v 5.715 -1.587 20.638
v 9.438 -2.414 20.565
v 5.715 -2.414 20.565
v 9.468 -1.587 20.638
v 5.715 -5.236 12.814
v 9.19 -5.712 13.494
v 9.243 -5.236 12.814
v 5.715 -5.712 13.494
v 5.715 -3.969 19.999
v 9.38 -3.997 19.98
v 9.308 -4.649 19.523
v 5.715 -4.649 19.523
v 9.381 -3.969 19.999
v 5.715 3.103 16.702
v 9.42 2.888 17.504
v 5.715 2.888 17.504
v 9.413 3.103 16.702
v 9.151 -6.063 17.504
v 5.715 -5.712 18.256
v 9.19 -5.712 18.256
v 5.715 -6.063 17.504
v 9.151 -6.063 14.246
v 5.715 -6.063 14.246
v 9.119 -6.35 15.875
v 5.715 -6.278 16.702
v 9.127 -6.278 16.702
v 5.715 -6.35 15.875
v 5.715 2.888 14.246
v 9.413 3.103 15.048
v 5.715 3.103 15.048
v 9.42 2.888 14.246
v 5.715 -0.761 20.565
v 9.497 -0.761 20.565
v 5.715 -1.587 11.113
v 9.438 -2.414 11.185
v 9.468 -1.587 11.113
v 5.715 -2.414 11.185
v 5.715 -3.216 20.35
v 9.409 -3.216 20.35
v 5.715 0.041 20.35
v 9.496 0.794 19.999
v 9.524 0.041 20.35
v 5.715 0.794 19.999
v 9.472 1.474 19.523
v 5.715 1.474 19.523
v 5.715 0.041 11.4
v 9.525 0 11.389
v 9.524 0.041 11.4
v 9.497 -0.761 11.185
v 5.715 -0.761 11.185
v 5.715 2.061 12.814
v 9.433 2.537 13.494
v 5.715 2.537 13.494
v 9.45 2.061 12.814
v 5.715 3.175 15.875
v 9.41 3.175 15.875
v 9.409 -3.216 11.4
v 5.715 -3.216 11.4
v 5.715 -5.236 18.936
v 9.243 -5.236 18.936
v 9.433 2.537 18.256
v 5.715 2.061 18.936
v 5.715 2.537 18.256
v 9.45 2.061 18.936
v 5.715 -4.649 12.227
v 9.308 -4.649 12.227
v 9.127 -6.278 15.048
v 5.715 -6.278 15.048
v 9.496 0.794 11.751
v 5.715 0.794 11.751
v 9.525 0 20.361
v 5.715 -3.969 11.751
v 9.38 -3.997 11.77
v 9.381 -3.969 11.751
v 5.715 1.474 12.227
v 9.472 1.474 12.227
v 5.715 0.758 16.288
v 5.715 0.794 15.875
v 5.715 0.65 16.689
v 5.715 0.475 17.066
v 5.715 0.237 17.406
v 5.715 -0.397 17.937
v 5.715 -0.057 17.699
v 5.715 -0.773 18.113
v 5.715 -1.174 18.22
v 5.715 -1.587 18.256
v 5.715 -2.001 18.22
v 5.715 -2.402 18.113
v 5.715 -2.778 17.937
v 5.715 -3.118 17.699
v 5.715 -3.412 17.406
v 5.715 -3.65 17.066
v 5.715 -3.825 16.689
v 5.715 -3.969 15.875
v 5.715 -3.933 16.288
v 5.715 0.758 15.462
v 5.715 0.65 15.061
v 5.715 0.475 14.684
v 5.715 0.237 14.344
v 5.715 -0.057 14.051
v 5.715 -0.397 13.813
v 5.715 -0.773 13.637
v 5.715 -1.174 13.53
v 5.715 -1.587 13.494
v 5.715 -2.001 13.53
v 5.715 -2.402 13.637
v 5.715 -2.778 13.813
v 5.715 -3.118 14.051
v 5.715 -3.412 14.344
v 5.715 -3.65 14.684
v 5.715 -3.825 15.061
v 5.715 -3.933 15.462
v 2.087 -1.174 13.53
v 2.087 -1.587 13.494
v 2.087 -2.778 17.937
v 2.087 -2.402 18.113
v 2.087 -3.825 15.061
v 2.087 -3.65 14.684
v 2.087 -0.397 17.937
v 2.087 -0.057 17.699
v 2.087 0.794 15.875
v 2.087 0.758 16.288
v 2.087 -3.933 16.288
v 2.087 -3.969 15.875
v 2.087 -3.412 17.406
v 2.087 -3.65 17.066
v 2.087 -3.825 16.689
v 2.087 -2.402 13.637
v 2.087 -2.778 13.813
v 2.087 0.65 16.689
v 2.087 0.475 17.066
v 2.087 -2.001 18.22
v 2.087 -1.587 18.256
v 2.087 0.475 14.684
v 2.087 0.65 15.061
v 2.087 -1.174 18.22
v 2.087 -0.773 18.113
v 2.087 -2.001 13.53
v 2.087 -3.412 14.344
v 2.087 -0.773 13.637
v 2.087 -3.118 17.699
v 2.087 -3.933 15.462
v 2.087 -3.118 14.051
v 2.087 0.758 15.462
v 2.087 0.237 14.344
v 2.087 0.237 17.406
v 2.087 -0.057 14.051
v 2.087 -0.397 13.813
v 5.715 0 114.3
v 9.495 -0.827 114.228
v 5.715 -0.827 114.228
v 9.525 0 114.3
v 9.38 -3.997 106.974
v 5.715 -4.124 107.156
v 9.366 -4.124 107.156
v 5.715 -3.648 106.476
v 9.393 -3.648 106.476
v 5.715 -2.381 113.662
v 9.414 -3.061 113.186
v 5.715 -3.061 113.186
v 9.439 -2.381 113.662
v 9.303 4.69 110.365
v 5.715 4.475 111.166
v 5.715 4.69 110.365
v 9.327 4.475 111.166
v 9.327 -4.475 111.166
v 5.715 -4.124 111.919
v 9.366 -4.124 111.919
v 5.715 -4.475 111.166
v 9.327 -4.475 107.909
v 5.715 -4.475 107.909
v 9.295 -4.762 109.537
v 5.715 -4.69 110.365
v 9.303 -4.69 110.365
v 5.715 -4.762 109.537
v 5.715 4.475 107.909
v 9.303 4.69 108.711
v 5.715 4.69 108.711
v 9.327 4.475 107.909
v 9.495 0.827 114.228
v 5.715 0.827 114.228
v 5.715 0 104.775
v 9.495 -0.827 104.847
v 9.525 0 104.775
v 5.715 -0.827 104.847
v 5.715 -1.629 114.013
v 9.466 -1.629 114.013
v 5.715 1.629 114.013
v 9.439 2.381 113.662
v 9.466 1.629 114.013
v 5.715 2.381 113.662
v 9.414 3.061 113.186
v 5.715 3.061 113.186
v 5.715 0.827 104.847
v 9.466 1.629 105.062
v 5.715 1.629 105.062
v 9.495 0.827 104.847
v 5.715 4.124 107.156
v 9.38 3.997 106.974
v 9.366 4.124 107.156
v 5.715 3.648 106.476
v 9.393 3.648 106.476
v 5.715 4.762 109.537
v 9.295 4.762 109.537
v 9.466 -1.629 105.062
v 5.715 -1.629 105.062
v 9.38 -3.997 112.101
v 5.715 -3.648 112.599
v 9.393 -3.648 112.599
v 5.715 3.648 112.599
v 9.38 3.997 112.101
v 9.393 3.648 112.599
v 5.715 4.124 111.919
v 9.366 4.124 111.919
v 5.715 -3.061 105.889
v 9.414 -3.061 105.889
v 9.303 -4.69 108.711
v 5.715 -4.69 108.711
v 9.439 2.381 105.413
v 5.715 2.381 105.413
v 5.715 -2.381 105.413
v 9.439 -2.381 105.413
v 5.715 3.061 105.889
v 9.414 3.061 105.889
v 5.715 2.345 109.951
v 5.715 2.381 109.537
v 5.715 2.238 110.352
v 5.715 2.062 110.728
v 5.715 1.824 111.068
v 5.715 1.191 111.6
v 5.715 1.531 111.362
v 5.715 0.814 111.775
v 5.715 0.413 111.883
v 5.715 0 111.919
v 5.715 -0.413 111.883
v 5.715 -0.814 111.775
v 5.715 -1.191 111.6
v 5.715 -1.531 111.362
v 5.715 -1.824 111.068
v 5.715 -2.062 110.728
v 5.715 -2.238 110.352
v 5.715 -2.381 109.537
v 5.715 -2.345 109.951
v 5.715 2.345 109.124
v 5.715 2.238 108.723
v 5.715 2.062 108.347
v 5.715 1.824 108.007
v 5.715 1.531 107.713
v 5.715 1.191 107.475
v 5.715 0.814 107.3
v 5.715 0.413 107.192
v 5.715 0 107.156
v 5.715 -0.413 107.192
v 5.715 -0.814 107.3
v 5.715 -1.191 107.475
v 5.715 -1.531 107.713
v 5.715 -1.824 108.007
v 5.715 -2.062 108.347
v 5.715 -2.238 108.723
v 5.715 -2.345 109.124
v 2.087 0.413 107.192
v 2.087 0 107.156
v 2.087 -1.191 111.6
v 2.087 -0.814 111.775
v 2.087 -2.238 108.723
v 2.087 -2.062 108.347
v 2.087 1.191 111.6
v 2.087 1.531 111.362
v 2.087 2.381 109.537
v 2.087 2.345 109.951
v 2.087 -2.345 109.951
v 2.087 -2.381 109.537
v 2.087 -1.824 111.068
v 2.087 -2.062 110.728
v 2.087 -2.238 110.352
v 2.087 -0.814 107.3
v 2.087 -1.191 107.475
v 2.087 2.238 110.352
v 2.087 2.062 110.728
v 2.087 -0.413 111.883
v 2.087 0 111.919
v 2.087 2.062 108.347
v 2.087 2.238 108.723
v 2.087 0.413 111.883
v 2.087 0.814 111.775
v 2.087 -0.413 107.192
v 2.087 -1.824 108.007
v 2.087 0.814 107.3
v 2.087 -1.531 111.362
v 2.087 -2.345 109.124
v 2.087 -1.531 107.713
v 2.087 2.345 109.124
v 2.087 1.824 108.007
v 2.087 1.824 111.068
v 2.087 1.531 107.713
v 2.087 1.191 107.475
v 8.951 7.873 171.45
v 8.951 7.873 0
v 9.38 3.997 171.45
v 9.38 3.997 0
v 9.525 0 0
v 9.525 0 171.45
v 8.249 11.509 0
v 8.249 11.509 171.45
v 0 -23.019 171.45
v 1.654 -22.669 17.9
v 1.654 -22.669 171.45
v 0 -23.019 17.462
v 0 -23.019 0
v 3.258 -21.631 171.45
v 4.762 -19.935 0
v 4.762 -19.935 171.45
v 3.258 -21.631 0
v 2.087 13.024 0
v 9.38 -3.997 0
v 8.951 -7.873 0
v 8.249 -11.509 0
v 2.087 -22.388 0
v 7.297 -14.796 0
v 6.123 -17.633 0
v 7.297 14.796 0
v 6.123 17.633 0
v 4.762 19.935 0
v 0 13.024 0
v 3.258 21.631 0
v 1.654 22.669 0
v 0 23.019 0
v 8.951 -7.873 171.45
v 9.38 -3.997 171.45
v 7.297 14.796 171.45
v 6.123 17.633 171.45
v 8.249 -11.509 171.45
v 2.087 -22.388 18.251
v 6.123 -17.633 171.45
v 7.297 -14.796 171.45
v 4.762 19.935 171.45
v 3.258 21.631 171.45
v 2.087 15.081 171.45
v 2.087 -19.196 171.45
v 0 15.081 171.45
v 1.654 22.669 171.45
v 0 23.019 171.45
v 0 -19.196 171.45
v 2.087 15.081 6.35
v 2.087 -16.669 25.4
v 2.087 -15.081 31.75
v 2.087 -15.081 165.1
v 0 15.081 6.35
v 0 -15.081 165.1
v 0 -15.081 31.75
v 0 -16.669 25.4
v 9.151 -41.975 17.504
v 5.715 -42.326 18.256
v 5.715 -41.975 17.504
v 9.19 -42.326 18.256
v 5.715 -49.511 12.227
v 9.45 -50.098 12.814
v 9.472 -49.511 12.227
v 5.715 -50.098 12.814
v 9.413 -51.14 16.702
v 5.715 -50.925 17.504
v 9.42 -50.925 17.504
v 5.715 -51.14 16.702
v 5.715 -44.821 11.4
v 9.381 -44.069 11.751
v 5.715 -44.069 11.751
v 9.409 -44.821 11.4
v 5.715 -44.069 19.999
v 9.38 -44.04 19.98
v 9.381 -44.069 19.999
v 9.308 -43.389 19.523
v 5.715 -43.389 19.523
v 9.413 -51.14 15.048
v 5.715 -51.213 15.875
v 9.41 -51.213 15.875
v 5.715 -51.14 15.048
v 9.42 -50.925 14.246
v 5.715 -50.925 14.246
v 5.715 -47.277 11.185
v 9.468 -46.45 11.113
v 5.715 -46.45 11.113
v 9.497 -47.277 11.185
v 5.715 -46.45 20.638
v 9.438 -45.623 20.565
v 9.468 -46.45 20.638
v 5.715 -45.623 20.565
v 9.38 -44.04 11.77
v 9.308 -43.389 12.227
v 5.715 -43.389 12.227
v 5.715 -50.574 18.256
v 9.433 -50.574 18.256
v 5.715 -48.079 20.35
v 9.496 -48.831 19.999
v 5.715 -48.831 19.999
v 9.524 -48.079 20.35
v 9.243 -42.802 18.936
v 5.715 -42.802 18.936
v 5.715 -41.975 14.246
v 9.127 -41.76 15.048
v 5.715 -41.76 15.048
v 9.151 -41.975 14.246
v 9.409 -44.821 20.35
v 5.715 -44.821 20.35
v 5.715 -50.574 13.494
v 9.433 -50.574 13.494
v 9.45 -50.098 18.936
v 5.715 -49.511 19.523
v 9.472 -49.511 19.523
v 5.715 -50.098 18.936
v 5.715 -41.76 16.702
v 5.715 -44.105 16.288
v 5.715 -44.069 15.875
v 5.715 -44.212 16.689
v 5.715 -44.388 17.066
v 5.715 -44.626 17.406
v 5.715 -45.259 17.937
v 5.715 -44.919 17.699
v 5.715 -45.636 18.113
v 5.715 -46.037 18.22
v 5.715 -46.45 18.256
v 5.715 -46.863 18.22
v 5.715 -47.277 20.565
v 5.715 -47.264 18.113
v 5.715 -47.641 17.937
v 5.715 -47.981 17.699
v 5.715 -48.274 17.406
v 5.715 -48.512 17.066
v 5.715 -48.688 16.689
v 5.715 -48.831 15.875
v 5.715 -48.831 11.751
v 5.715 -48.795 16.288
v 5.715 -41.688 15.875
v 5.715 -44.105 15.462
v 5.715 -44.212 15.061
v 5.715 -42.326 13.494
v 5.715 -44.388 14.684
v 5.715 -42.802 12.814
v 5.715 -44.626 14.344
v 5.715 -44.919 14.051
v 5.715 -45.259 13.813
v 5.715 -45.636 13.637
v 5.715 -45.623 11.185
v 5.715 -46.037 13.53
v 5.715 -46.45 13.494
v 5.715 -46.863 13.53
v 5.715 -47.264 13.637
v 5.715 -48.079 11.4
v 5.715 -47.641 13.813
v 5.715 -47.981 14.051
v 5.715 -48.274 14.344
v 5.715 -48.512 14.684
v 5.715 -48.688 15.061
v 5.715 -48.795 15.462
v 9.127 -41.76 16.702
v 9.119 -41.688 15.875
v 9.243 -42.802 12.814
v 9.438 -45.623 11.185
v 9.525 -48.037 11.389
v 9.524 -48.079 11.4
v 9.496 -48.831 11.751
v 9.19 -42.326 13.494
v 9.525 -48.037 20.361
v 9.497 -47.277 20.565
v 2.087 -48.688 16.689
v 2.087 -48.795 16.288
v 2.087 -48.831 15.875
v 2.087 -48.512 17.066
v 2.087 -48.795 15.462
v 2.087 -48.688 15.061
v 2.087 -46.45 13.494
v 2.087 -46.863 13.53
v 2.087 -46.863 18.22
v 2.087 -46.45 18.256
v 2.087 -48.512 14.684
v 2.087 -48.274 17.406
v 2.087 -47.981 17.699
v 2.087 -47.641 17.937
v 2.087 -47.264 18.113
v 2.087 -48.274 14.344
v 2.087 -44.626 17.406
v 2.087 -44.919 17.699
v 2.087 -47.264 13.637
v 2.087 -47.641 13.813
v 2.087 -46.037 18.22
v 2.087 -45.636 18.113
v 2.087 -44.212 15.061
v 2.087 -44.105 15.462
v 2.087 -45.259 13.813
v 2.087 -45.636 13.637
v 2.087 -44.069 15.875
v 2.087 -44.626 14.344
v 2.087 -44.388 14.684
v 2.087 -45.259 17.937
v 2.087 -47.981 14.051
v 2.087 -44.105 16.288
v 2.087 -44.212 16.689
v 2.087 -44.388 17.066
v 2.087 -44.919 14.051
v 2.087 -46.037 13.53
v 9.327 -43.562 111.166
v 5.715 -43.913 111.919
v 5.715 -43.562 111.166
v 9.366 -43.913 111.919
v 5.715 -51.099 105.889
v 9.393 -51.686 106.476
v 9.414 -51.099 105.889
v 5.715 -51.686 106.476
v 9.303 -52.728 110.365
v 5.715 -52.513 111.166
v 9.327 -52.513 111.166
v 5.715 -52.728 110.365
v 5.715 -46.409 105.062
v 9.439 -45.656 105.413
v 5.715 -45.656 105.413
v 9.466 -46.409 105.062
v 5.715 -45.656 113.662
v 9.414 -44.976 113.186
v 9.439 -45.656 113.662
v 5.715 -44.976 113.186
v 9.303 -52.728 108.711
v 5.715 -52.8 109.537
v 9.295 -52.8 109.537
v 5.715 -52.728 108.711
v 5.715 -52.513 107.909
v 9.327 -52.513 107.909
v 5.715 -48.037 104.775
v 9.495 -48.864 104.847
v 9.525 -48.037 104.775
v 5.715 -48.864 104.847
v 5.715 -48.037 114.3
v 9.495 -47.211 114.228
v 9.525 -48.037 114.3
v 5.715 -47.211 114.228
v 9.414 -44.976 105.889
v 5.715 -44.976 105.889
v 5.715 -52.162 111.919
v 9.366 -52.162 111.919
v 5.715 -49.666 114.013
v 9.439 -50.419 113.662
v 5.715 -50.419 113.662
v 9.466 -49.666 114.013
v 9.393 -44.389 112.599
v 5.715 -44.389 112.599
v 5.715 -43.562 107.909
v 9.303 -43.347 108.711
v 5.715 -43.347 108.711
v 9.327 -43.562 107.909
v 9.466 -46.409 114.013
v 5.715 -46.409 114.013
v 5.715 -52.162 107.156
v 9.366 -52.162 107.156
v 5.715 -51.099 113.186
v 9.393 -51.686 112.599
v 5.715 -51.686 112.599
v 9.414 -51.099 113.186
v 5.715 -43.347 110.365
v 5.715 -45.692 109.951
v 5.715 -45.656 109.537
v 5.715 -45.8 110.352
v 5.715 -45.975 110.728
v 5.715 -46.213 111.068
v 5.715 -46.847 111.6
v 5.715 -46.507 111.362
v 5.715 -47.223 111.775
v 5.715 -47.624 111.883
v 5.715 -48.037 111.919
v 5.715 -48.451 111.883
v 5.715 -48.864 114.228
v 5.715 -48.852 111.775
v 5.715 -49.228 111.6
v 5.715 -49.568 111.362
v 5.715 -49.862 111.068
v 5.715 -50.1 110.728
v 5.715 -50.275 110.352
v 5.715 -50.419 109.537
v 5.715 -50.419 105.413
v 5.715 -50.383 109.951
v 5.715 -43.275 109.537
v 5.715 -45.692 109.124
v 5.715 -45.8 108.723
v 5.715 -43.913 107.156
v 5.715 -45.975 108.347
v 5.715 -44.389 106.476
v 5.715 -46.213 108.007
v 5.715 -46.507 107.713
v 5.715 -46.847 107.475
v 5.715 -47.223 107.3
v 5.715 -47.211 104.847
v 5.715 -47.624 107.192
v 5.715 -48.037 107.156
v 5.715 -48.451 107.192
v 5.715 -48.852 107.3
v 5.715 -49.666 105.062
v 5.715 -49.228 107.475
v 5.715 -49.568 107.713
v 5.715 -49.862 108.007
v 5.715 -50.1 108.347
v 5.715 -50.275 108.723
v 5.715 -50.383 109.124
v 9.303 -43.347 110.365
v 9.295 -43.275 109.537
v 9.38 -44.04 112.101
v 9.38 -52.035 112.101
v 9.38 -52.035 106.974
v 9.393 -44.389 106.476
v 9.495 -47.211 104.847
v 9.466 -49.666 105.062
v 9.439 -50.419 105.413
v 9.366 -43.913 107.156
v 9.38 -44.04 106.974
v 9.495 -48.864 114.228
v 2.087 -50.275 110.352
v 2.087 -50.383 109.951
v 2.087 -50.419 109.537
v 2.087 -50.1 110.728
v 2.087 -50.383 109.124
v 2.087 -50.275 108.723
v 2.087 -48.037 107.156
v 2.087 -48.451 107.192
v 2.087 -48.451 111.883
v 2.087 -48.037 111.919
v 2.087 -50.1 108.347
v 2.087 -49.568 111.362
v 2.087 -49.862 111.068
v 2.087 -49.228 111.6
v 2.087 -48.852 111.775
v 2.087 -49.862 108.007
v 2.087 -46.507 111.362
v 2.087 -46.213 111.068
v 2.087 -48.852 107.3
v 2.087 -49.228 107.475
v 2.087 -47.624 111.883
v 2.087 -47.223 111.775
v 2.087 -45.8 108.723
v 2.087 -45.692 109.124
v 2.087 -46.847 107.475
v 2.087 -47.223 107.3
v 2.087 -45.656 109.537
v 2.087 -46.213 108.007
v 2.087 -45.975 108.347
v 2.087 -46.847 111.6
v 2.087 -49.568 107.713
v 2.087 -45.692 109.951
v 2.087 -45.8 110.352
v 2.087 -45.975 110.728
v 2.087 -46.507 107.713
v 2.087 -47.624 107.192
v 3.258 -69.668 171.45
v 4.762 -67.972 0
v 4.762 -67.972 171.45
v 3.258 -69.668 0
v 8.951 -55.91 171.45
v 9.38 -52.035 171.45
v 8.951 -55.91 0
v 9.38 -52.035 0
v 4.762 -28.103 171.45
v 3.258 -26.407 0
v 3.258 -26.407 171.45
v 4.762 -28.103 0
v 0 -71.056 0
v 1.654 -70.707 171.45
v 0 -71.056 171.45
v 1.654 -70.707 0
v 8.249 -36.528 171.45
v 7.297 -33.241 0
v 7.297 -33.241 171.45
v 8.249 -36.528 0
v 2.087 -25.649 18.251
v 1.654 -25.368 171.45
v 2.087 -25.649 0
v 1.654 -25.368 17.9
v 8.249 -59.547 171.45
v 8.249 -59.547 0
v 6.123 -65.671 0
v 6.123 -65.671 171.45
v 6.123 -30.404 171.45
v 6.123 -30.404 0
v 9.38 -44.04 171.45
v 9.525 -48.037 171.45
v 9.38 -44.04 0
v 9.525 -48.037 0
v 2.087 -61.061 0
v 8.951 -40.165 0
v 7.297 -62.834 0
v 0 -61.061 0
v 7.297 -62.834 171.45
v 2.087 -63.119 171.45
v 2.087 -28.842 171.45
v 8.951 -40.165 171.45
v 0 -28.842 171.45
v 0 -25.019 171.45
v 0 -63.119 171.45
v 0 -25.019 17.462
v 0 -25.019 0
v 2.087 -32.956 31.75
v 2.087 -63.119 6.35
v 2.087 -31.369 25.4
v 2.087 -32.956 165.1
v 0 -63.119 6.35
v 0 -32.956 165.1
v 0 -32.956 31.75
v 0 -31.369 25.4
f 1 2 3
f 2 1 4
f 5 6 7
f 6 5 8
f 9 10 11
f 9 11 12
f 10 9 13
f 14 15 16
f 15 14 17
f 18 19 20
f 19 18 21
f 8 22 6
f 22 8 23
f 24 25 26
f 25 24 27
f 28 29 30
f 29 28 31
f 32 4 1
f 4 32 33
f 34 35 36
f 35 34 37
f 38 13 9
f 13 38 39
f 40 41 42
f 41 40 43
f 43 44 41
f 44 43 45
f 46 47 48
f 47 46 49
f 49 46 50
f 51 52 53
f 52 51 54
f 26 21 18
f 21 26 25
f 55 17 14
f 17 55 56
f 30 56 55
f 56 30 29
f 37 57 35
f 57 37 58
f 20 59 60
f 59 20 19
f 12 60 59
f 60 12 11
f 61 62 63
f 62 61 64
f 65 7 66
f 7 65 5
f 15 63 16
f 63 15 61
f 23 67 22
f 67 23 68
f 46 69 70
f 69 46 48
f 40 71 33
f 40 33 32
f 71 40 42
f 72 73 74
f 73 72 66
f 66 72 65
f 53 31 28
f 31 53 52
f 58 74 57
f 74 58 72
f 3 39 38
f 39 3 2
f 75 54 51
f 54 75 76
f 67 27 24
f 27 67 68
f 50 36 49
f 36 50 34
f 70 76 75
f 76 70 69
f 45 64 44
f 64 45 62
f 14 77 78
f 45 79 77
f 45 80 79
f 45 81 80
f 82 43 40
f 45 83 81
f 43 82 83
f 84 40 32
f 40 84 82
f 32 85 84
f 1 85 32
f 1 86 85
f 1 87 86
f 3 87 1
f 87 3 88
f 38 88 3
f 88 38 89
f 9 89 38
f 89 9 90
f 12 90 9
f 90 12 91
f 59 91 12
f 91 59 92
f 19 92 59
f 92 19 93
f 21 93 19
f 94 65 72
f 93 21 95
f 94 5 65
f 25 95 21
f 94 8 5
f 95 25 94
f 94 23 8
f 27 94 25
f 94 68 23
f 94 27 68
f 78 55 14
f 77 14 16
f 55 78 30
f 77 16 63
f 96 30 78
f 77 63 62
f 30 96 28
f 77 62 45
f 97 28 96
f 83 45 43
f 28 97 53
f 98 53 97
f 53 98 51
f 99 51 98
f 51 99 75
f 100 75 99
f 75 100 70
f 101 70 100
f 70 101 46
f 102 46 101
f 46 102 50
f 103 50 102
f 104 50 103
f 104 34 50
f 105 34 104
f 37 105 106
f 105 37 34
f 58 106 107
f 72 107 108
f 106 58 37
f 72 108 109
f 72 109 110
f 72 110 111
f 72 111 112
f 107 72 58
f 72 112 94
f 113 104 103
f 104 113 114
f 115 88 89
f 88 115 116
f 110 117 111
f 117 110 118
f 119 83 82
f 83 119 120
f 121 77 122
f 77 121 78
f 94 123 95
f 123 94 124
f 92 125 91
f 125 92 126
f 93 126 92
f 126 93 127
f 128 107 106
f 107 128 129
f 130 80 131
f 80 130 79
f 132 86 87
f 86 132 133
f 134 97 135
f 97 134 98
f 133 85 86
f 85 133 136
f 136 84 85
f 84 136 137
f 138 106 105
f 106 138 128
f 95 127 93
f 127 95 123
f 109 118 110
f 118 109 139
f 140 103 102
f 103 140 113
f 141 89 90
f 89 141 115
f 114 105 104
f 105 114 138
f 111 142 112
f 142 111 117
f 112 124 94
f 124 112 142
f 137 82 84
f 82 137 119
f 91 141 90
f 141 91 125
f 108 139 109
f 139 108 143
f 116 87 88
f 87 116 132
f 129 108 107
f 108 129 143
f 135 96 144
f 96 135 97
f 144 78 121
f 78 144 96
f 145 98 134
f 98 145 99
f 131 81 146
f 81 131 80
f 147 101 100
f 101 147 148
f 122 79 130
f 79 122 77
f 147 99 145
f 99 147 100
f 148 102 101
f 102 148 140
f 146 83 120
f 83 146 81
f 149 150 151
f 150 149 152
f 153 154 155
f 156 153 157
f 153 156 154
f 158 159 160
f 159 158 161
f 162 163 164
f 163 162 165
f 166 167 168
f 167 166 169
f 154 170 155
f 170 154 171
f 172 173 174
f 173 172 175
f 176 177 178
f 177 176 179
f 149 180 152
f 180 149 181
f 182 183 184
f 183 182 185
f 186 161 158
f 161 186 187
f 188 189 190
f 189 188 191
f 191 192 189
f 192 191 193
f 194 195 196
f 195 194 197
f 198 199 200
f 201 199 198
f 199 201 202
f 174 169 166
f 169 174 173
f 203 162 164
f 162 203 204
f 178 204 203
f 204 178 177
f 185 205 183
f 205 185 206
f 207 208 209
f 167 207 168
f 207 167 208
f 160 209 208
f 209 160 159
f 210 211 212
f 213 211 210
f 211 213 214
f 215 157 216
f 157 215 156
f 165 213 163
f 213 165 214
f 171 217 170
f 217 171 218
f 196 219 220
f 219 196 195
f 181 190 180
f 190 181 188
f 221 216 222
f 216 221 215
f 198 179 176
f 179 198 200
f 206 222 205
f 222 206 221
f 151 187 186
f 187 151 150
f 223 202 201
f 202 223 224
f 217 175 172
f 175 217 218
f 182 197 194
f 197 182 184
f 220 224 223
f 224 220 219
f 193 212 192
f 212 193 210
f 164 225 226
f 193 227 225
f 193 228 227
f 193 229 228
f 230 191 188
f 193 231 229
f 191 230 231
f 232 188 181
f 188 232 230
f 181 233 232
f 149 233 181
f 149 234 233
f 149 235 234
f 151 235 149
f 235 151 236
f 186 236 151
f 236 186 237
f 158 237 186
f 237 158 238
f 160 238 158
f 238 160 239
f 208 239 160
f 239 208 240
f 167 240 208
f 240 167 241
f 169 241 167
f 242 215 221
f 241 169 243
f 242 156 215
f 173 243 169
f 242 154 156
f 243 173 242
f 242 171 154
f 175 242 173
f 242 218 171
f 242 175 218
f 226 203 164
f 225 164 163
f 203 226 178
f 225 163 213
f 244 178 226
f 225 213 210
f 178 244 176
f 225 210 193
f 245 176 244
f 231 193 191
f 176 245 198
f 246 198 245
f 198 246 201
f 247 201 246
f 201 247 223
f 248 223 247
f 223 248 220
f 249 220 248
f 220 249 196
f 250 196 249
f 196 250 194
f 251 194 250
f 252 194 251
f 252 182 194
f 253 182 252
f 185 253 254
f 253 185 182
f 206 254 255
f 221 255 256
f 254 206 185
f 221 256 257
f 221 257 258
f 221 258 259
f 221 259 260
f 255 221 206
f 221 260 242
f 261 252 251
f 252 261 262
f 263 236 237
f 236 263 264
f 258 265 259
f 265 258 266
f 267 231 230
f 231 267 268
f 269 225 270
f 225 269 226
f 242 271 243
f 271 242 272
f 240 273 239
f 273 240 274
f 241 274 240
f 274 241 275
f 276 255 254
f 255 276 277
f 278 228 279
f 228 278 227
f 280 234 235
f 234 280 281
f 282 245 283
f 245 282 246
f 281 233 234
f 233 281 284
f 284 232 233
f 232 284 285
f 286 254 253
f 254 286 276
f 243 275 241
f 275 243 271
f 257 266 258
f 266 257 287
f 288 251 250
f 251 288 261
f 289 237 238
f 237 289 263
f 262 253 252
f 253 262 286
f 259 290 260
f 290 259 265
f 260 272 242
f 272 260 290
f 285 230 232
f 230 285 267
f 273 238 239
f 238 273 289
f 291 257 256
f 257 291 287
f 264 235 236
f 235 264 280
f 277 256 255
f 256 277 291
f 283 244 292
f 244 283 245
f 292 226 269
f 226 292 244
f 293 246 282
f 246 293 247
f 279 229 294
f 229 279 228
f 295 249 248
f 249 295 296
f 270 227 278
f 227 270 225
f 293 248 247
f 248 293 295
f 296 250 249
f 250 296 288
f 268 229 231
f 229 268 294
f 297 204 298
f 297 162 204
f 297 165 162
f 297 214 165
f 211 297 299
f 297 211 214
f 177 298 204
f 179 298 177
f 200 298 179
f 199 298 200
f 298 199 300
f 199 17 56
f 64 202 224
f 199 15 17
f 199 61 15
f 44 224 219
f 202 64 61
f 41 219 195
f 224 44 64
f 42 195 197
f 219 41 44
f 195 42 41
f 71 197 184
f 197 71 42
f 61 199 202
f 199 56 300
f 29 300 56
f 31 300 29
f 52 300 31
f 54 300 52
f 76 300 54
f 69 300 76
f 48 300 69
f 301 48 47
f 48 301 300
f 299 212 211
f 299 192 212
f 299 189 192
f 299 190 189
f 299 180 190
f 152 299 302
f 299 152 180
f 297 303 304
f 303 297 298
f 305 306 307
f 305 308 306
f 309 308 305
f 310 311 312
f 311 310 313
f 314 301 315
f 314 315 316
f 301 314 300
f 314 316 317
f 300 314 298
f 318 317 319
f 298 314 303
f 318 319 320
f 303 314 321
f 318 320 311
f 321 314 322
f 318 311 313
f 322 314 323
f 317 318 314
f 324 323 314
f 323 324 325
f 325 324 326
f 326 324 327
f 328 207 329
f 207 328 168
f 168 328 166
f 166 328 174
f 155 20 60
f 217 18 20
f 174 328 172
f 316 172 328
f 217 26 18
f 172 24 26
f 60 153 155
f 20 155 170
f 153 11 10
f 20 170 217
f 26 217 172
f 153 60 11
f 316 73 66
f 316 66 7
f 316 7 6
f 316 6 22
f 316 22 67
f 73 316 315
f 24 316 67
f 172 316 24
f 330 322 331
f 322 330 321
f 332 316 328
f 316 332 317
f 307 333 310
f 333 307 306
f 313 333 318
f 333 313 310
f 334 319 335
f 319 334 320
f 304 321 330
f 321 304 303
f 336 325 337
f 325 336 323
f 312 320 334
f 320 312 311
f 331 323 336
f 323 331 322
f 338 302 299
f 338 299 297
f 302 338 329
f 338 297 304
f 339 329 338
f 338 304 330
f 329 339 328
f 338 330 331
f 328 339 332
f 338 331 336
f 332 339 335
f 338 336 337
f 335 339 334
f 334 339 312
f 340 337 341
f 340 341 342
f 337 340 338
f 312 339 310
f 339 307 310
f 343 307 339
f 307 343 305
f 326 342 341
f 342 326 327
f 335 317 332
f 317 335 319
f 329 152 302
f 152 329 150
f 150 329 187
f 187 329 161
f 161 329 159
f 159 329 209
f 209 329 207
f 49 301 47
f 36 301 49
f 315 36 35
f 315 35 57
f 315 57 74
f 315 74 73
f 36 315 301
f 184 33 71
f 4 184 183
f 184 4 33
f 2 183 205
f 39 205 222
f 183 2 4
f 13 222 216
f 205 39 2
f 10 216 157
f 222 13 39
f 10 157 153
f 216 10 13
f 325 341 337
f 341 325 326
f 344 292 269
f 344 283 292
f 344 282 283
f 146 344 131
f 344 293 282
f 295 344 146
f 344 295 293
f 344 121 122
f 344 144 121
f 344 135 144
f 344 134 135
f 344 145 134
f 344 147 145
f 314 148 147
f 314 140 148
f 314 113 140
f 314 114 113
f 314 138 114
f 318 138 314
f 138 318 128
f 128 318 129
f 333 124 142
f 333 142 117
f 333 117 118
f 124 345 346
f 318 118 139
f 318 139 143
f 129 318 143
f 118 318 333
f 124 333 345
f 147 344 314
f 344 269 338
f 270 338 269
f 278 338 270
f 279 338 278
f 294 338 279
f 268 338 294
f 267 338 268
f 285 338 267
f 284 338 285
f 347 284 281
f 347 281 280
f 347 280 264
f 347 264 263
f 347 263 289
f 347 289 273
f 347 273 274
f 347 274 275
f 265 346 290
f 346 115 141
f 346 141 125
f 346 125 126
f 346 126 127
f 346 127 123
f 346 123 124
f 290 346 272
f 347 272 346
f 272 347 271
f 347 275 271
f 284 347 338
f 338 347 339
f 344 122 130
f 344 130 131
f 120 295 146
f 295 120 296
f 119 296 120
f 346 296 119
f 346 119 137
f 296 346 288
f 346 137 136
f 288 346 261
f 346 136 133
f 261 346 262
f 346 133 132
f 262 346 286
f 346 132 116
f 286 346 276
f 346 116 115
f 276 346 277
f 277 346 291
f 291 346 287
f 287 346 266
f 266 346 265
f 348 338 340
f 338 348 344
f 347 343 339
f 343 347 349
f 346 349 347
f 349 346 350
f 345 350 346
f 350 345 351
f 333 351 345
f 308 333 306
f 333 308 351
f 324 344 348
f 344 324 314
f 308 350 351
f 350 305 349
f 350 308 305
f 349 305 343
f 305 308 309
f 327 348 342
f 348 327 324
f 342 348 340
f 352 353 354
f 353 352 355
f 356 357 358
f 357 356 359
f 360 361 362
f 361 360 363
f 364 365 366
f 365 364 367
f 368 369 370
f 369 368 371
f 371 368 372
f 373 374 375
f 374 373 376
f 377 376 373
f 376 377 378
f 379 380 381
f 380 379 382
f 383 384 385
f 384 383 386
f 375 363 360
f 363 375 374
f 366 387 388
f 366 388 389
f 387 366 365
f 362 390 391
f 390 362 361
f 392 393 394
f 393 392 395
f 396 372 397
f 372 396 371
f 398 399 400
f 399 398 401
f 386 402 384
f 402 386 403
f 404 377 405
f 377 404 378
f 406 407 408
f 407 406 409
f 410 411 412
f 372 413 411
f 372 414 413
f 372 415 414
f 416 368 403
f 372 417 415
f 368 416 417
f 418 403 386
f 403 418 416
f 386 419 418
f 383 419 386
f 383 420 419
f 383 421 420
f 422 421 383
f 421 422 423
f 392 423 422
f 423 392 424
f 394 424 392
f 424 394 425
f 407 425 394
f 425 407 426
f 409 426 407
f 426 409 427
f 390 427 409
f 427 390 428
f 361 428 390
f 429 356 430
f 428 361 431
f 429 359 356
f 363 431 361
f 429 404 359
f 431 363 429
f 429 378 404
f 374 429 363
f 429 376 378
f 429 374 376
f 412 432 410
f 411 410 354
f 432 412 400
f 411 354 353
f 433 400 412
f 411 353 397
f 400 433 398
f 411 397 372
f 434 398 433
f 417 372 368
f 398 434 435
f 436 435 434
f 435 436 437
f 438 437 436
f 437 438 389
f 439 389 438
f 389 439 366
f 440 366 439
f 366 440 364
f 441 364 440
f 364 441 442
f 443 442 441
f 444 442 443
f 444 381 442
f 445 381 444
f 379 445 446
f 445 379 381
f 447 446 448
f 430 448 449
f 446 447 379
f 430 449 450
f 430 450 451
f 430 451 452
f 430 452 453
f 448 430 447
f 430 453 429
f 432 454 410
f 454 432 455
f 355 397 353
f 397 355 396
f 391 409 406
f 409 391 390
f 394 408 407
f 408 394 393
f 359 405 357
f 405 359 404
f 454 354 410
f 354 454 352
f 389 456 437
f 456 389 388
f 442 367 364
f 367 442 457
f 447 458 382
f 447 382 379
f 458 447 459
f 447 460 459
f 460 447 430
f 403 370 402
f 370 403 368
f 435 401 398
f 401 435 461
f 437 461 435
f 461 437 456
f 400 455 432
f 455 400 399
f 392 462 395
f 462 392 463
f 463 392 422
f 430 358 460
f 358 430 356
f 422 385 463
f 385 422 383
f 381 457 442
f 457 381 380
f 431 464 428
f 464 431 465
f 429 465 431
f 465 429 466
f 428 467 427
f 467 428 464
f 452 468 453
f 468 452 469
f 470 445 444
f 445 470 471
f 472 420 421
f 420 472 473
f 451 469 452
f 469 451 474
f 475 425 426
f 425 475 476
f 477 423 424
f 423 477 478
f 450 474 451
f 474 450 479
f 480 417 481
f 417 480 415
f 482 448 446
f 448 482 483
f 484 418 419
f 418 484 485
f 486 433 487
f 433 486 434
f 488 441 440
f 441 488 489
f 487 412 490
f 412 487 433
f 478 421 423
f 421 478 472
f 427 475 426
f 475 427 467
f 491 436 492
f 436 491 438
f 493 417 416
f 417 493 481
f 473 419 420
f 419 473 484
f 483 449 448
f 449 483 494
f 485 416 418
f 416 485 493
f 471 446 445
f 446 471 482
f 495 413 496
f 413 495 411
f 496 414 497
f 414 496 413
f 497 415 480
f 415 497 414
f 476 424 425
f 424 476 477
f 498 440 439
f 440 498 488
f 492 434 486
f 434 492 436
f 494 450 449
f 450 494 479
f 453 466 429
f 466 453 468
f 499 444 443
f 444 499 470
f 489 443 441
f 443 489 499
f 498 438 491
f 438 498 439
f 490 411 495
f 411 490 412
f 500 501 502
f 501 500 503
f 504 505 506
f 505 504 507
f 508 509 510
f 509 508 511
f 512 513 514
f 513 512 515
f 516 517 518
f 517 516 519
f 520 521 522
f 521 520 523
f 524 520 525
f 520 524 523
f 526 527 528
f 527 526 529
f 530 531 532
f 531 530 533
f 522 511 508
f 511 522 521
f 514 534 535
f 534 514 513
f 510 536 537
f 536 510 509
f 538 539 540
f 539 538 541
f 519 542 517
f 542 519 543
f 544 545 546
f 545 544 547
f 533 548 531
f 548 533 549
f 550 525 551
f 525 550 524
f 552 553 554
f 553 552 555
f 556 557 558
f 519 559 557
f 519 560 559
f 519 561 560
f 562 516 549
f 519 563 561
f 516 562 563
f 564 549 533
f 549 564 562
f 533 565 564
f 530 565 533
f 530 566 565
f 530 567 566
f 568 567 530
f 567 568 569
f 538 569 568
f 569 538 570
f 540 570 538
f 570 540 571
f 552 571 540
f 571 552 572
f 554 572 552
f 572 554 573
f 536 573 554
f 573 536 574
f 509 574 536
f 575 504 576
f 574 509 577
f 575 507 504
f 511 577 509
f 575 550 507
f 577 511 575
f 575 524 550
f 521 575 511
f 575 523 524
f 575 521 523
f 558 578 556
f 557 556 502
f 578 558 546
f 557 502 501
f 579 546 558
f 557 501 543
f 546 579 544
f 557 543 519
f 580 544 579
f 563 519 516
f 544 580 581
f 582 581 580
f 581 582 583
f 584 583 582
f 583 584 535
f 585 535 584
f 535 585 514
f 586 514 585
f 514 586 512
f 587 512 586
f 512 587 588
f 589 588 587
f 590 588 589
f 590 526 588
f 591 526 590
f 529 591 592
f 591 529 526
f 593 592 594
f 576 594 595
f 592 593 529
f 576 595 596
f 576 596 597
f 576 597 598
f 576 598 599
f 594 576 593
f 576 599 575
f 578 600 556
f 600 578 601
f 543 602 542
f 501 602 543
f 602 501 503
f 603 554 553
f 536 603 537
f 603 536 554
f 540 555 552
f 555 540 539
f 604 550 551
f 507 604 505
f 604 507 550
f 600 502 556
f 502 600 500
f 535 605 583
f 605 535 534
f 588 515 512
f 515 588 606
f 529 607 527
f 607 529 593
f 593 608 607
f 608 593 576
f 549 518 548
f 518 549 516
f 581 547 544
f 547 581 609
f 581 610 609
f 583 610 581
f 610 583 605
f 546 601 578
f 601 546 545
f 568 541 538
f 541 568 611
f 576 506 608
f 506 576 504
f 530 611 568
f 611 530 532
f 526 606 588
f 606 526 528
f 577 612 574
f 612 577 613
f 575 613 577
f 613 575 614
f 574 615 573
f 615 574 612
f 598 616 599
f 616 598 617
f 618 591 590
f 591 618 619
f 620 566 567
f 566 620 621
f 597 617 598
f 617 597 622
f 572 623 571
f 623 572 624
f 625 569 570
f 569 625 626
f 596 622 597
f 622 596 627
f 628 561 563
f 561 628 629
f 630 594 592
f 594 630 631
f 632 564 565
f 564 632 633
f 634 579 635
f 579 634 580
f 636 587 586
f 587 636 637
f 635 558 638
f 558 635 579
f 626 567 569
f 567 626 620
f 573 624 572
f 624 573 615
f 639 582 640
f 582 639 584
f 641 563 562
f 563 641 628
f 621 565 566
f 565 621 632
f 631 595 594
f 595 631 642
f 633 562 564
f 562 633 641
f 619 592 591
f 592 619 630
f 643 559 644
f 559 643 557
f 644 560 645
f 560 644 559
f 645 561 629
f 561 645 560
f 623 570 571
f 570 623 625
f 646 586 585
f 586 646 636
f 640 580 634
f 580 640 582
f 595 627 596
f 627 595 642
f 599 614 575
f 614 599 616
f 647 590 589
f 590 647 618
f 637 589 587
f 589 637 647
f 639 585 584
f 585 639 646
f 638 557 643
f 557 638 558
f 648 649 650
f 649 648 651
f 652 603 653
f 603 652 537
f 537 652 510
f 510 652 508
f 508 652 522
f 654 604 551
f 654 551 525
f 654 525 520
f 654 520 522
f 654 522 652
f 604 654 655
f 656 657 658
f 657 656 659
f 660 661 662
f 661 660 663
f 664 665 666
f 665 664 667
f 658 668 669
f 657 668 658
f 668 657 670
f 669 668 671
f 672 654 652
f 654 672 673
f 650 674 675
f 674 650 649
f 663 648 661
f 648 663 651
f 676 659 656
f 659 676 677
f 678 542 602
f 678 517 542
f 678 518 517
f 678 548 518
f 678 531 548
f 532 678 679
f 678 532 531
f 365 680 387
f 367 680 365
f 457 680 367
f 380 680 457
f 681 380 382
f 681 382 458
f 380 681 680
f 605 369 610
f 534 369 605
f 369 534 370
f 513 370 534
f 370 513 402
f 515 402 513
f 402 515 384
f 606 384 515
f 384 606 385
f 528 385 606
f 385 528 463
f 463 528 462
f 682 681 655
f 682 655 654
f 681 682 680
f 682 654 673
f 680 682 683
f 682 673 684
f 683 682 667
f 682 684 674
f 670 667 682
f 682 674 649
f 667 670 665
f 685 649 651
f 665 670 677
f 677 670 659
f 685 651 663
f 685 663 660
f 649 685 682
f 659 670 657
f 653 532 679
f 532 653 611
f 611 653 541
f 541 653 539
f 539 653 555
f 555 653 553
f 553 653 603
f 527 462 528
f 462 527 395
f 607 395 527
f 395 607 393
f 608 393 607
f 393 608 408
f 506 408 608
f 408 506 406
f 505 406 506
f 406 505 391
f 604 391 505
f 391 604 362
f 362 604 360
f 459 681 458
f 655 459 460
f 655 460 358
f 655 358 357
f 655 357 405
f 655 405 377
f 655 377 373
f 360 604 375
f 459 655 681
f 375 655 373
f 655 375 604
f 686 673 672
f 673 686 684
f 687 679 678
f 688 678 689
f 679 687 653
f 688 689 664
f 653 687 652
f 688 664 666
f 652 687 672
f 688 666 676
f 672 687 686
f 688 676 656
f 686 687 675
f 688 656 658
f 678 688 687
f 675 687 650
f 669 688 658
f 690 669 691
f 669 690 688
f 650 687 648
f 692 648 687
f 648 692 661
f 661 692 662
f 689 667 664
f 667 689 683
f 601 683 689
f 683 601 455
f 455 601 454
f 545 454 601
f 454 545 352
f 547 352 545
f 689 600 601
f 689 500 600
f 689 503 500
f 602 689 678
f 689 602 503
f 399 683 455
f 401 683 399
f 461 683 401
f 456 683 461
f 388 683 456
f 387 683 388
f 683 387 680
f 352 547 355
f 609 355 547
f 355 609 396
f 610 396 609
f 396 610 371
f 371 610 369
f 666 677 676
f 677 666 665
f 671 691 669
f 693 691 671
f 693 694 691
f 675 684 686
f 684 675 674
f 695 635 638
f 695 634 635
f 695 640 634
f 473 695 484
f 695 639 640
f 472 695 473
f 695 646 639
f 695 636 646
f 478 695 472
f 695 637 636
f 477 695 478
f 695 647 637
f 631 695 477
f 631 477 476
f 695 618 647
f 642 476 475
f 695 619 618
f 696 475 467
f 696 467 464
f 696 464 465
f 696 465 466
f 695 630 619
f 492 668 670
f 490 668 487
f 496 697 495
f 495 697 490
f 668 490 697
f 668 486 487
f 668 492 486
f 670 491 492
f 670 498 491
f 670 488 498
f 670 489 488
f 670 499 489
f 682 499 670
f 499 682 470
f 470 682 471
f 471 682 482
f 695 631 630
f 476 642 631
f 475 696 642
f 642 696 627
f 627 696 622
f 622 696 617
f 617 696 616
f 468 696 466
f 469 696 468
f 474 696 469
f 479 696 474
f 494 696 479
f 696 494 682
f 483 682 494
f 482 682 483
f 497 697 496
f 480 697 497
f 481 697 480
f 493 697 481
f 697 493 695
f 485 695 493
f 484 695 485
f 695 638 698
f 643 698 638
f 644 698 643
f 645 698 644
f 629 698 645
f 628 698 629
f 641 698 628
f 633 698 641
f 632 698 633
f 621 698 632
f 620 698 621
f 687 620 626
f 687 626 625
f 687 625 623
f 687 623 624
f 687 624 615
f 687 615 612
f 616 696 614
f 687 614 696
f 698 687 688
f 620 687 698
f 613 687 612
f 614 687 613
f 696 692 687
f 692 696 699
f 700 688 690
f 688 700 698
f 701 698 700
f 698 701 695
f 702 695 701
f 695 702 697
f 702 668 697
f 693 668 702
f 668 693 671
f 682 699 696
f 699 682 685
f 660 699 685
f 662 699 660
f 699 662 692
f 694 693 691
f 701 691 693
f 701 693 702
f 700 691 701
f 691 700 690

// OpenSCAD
/* Handle length in inches */
handle_length_inches = 6.75;

/* Handle depth is the distance from the blade end to the opposite side, in inches */
handle_depth_inches = 1 + (15/16);
handle_depth_inches = 1 + (13/16);

/* Handle width is the distance from one flat side of the blade to the opposite side, in inches */
handle_width_inches = 1;
handle_width_inches = 12/16;

/* Blade depth is the distance from the blade end to the opposite side, in inches */
blade_depth_inches = 1 + (6/16);
blade_depth_inches = 1 + (7/16);

/* Blade width is the distance from one flat side of the blade to the opposite side, in inches */
blade_width_inches = 1/16;

blade_handle_offset = 2/16 * 25.4;

/* This is the outer hole that has to be big enough to fit the head of a screw/bolt */
mounting_hole_outer_diameter_inches = 0.375;

/* This is the inner hole that has to be big enough to fit the threaded part of a screw/bolt, but small enough to catch the head */
mounting_hole_inner_diameter_inches = 0.1875;

/* This is the depth from the furthest point out to the surface which catches the head of the bolt */
mounting_hole_depth_inches = 0.150;

color("grey")
sword_handle(handle_length_inches, 
             handle_depth_inches, 
             handle_width_inches, 
             blade_depth_inches, 
             blade_width_inches, 
             mounting_hole_outer_diameter_inches, 
             mounting_hole_inner_diameter_inches,
             mounting_hole_depth_inches);

/*********************************************************************************************
* MODULE 	sword_handle
*********************************************************************************************/
module sword_handle(handle_length_inches, 
                    handle_depth_inches, 
                    handle_width_inches, 
                    blade_depth_inches, 
                    blade_width_inches,
                    mounting_hole_outer_diameter_inches,
                    mounting_hole_inner_diameter_inches,
                    mounting_hole_depth_inches)
{
    $fn = 36;
    
    handle_length = handle_length_inches * 25.4;
    handle_depth = handle_depth_inches * 25.4;
    handle_width = handle_width_inches * 25.4;
    
    blade_depth = blade_depth_inches * 25.4;
    blade_width = blade_width_inches * 25.4;
	
	/* Complex shape using multiple points. Referenced paper graph */
	o = [blade_depth,				handle_length + 1				];
	a = [blade_depth, 				(3/4) * 25.4					];
	b = [blade_depth, 				(2/4) * 25.4					];
	c = [blade_depth,				(1/4) * 25.4					];
	d = [blade_depth - (3/32)*25.4, (-1)		 					];
	e = [0,							(-1)		 					];
	e = [-((1/16)*25.4),			(-1)		 					];
	f = [(1/32)*25.4, 				(1/4) * 25.4					];
	f = [-(1/16)*25.4, 				(1/4) * 25.4					];
	g = [(2/32)*25.4, 				((2/4) - (1/16)) * 25.4			];
	g = [-(1/16)*25.4, 				((2/4) - (2/16)) * 25.4			];
	h = [0, 						((2/4) + (1/16)) * 25.4			];
	h = [-(1/16)*25.4,				((2/4) + (1/16)) * 25.4			];
	i = [-(1/16)*25.4, 				((2/4) + (3/16)) * 25.4			];
	i = [-(1/16)*25.4,				((2/4) + (3/16)) * 25.4			];
	j = [(3/16)*25.4,				(4/4) * 25.4					];
	k = [(4/16)*25.4,				(5/4) * 25.4					];
	l = [(4/16)*25.4,				handle_length - (1/4) * 25.4	];
	m = [(1/16)*25.4,				handle_length + 1				];
	
	blade_shape = [o, a, b, c, d, e, f, g, h, i, j, k, l, m, o];
    	
    mounting_hole_outer_diameter = mounting_hole_outer_diameter_inches * 25.4;
    mounting_hole_inner_diameter = mounting_hole_inner_diameter_inches * 25.4;
    mounting_hole_depth = mounting_hole_depth_inches * 25.4;
	
	//mounting_hole_1_length_offset = (mounting_hole_outer_diameter / 2);
	mounting_hole_1_length_offset = (5/8) * 25.4;
	mounting_hole_1_width_offset  = (1/16) * 25.4;
	mounting_hole_2_length_offset = ((5/8) + (3 + (11/16))) * 25.4 ;
	
	difference()
	{
		union()
		{
			/* This is the first half of the handle, minus other features */
			difference()
			{
				/* This is the actual handle. Its a cylinder scaled on one axis to make an oval cylinder */
				scale([(handle_width / handle_depth), 1, 1])
				cylinder(handle_length, d = handle_depth, false);
				
				/* This is the hole where the blade handle goes */
				translate([(blade_width / 2), -(blade_depth / 2) - blade_handle_offset, 0])
				rotate([90,0,90])
				linear_extrude(height = blade_width + 1, center = true, convexity = 0, twist = 0, slices = 1, scale = 1.0)
				polygon(points = blade_shape, convexity = 1);
				//cube([blade_width, blade_depth, handle_length + 2], false);
				
				/* This is the first mounting hole */
				translate([0, -mounting_hole_1_width_offset, mounting_hole_1_length_offset])
				sword_handle_mounting_hole(handle_width, mounting_hole_depth, mounting_hole_outer_diameter, mounting_hole_inner_diameter);

				/* This is the second mounting hole */
				translate([0, 0, mounting_hole_2_length_offset])
				sword_handle_mounting_hole(handle_width, mounting_hole_depth, mounting_hole_outer_diameter, mounting_hole_inner_diameter);
				
				/* This cuts it cross-sectionally to remove half */
				translate([-(handle_width / 2), -(handle_depth / 2), -1])
				cube([handle_width / 2, handle_depth, handle_length + 2], false);
			}

			// /* This is the first half of the handle, minus other features */
			rotate([0,0,180])
			translate([0,handle_depth + 2,0])
			difference()
			{
				/* This is the actual handle. Its a cylinder scaled on one axis to make an oval cylinder */
				scale([(handle_width / handle_depth), 1, 1])
				cylinder(handle_length, d=handle_depth, false);
				
				/* This is the hole where the blade handle goes */
				translate([-(blade_width / 2), -(blade_depth / 2) - blade_handle_offset, 0])
				rotate([90,0,90])
				linear_extrude(height = blade_width + 1, center = true, convexity = 0, twist = 0, slices = 1, scale = 1.0)
				polygon(points = blade_shape, convexity = 1);
				//square([blade_depth, handle_length + 2]);
				//cube([blade_width, blade_depth, handle_length + 2], false);

				/* This is the first mounting hole */
				translate([0, -mounting_hole_1_width_offset,mounting_hole_1_length_offset])
				sword_handle_mounting_hole(handle_width, mounting_hole_depth, mounting_hole_outer_diameter, mounting_hole_inner_diameter);

				/* This is the second mounting hole */
				translate([0, 0, mounting_hole_2_length_offset])
				sword_handle_mounting_hole(handle_width, mounting_hole_depth, mounting_hole_outer_diameter, mounting_hole_inner_diameter);
				
				/* This is the hole where the blade handle goes */
				translate([0, -(handle_depth / 2), -1])
				cube([handle_width / 2, handle_depth, handle_length + 2], false);
			}

			// // /* This is the first half of the handle, minus other features */
			// rotate([0,0,180])
			// translate([0,(2 * (handle_depth + 2)),0])
			// difference()
			// {
				// /* This is the actual handle. Its a cylinder scaled on one axis to make an oval cylinder */
				// scale([(handle_width / handle_depth), 1, 1])
				// //cylinder(handle_length, d=handle_depth, false);
				// polyhedron();
				
				// /* This is the hole where the blade handle goes */
				// translate([-(blade_width / 2), -(blade_depth / 2), 0])
				// rotate([90,0,90])
				// linear_extrude(height = blade_width + 1, center = true, convexity = 0, twist = 0, slices = 1, scale = 1.0)
				// polygon(points = blade_shape, convexity = 1);
				// //square([blade_depth, handle_length + 2]);
				// //cube([blade_width, blade_depth, handle_length + 2], false);

				// /* This is the first mounting hole */
				// translate([0, -mounting_hole_1_width_offset *50, mounting_hole_1_length_offset])
				// sword_handle_mounting_hole(handle_width, mounting_hole_depth, mounting_hole_outer_diameter, mounting_hole_inner_diameter);

				// /* This is the second mounting hole */
				// translate([0, 0, mounting_hole_2_length_offset])
				// sword_handle_mounting_hole(handle_width, mounting_hole_depth, mounting_hole_outer_diameter, mounting_hole_inner_diameter);
				
				// /* This is the hole where the blade handle goes */
				// translate([0, -(handle_depth / 2), -1])
				// cube([handle_width / 2, handle_depth, handle_length + 2], false);
			// }
		}		
		
		sword_handle_finger_grips(handle_width);
	}
};

/*********************************************************************************************
* MODULE 	sword_handle_mounting_hole
*********************************************************************************************/
module sword_handle_mounting_hole(handle_width,
							      mounting_hole_depth, 
								  mounting_hole_outer_diameter, 
								  mounting_hole_inner_diameter)
{
	/* This is the first mounting hole, left side */
	translate([(handle_width / 2), 0, 0])
	{
		rotate([90, 0, -90])
		{
			cylinder(mounting_hole_depth, d=mounting_hole_outer_diameter, false);
		}
		
		rotate([90, 0, -90])
		{
			cylinder((handle_width / 2), d=mounting_hole_inner_diameter, false);
		}
	}
	
	/* This is the first mounting hole, right side */
	translate([-(handle_width / 2), 0, 0])
	{
		rotate([90, 0, 90])
		{
			cylinder(mounting_hole_depth, d=mounting_hole_outer_diameter, false);
		}
		
		rotate([90, 0, 90])
		{
			cylinder((handle_width / 2), d=mounting_hole_inner_diameter, false);
		}
	}
}


module sword_handle_finger_grips(handle_width, frequency)
{
	for (angle=[0:10:360])
	{
		echo(sin(angle));
	}
}

function select(vector,indices) = [ for (index = indices) vector[index] ];
